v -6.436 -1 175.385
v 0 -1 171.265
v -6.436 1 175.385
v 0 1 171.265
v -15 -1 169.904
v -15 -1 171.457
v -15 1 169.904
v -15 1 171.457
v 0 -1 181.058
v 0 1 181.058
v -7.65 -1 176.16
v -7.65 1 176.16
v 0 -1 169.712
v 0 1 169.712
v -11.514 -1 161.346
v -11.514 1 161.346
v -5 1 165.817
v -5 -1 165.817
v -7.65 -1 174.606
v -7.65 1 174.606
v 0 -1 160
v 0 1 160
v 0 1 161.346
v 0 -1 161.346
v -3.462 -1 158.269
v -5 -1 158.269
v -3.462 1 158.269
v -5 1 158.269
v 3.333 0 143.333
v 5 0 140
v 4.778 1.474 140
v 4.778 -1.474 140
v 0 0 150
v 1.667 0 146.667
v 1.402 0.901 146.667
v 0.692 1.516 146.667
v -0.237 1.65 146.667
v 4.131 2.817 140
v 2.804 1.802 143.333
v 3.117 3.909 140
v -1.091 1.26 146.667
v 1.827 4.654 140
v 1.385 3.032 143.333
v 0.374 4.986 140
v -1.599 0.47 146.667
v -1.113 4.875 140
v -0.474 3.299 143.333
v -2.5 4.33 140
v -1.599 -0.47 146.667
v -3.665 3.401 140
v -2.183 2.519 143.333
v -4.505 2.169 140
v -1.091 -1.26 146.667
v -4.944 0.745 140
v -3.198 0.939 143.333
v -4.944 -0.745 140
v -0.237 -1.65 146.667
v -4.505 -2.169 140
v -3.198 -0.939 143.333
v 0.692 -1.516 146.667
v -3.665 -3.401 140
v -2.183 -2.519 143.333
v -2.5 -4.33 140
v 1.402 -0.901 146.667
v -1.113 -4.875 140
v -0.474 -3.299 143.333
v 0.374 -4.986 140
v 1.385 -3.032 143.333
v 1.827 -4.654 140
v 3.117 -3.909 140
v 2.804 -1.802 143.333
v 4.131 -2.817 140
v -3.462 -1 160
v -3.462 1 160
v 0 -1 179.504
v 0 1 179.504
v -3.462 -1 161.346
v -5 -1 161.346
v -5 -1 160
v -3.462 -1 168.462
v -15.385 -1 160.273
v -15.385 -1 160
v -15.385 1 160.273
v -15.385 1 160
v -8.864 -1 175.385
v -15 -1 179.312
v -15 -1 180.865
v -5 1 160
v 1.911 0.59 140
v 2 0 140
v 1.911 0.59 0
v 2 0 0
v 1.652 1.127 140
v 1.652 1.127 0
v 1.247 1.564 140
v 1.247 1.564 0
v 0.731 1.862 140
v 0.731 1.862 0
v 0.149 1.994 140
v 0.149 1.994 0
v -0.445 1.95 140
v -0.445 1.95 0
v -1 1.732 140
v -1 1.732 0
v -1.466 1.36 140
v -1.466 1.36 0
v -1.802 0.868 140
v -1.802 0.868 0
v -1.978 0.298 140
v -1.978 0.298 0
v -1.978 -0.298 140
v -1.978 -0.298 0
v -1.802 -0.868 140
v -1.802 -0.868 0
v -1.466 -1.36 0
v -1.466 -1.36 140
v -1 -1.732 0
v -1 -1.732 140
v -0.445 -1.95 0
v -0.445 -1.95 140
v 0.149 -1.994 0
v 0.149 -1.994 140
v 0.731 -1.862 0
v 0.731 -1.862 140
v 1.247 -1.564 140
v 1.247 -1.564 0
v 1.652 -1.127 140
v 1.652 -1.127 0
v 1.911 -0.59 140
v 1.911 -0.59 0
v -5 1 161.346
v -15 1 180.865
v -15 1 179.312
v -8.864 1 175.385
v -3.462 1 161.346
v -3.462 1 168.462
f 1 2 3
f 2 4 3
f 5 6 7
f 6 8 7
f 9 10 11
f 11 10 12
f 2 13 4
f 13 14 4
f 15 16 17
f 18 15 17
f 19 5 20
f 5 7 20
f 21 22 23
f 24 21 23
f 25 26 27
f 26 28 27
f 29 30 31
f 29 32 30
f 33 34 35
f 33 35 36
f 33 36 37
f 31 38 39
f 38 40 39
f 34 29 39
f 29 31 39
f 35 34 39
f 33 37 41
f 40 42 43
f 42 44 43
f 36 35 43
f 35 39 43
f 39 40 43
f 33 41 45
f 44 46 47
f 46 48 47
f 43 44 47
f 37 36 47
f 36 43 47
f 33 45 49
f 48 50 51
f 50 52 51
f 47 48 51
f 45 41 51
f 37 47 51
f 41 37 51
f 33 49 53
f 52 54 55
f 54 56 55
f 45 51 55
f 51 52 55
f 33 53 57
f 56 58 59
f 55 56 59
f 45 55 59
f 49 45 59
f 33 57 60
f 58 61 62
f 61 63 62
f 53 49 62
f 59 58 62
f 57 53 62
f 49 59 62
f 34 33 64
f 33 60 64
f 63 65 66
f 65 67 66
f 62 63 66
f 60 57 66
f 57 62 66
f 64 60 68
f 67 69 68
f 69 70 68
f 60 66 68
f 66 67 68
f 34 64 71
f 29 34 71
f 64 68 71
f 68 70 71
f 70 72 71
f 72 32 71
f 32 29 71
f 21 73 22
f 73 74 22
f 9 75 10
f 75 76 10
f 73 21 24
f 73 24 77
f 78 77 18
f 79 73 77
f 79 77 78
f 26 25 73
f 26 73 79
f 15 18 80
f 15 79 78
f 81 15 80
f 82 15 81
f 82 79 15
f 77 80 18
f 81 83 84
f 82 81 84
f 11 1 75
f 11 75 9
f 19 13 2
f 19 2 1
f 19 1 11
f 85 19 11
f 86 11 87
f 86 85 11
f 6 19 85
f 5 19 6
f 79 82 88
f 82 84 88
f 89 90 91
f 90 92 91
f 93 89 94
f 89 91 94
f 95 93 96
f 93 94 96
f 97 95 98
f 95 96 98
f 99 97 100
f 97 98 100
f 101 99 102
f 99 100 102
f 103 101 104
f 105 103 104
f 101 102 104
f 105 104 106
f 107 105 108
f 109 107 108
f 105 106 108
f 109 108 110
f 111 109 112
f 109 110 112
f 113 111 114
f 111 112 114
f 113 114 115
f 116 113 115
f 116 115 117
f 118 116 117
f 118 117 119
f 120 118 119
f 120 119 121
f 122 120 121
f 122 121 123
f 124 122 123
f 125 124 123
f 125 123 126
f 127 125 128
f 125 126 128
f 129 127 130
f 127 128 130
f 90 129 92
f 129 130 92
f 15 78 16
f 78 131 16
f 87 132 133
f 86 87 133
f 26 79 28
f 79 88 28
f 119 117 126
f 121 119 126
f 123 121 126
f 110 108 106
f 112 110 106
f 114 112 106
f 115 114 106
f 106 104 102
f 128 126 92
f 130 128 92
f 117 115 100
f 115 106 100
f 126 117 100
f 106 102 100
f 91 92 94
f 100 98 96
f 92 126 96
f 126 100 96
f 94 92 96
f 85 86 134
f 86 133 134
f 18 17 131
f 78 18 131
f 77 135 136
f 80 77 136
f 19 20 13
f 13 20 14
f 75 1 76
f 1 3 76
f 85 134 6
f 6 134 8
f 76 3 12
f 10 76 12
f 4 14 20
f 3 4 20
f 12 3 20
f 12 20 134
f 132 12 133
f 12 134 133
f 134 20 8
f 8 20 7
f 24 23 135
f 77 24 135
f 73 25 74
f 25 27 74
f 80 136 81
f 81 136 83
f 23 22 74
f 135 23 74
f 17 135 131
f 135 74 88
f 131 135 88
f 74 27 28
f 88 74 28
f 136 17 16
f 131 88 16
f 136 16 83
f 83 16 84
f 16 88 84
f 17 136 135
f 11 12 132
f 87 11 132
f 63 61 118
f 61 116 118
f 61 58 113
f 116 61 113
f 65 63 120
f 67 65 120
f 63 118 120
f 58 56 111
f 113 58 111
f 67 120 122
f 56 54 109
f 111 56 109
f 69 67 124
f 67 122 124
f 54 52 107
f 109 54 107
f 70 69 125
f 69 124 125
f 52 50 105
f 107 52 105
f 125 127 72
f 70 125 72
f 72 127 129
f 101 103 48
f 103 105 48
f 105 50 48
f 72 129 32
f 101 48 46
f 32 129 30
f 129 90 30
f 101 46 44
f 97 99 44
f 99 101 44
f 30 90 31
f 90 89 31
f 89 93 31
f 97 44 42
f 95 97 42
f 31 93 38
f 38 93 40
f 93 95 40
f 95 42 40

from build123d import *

# Parameters (mm, degrees)
BOSS_EXTRUDE1_DEPTH        = 1
BOSS_EXTRUDE1_DEPTH_BACK   = 1
BOSS_EXTRUDE1_2_DEPTH      = 1
BOSS_EXTRUDE1_2_DEPTH_BACK = 1


with BuildPart() as part:
    # Sketch2 → Revolve1 (revolve)
    with BuildSketch(Plane(origin=(0, 0, 0), x_dir=(1, 0, 0), z_dir=(0, 1, 0))):
        Polygon((0, -150), (5, -140), (2, -140), (2, 0), (0, 0), align=None)
    revolve(axis=Axis((0, 0, -41.949952025), (0, 0, 1)))


with BuildPart() as body_2:
    # Sketch3 → Boss-Extrude1 (new, two sides: drawn at the far end of the back side and taken through both)
    with BuildSketch(Plane(origin=(0, 0, 0), x_dir=(1, 0, 0), z_dir=(0, 1, 0)).offset(-BOSS_EXTRUDE1_DEPTH_BACK)):
        Polygon((-15.384615385, -160.2734375), (-15.384615385, -160), (-5, -160), (-5, -158.269230769), (-3.461538462, -158.269230769), (-3.461538462, -160), (0, -160), (0, -161.346153846), (-3.461538462, -161.346153846), (-3.461538462, -168.461538462), align=None)
        Polygon((-5, -161.346153846), (-11.514423077, -161.346153846), (-5, -165.817307692), align=None, mode=Mode.SUBTRACT)
    extrude(amount=BOSS_EXTRUDE1_DEPTH + BOSS_EXTRUDE1_DEPTH_BACK)


with BuildPart() as body_3:
    # Sketch3 → Boss-Extrude1 2 (new, two sides: drawn at the far end of the back side and taken through both)
    with BuildSketch(Plane(origin=(0, 0, 0), x_dir=(1, 0, 0), z_dir=(0, 1, 0)).offset(-BOSS_EXTRUDE1_2_DEPTH_BACK)):
        Polygon((-15, -180.865384615), (-15, -179.311899038), (-8.864182692, -175.384615385), (-15, -171.457331731), (-15, -169.903846154), (-7.650240385, -174.606370192), (0, -169.711538462), (0, -171.265024038), (-6.436298077, -175.384615385), (0, -179.504206731), (0, -181.057692308), (-7.650240385, -176.159855769), align=None)
    extrude(amount=BOSS_EXTRUDE1_2_DEPTH + BOSS_EXTRUDE1_2_DEPTH_BACK)


solid = Compound([part.part, body_2.part, body_3.part])
